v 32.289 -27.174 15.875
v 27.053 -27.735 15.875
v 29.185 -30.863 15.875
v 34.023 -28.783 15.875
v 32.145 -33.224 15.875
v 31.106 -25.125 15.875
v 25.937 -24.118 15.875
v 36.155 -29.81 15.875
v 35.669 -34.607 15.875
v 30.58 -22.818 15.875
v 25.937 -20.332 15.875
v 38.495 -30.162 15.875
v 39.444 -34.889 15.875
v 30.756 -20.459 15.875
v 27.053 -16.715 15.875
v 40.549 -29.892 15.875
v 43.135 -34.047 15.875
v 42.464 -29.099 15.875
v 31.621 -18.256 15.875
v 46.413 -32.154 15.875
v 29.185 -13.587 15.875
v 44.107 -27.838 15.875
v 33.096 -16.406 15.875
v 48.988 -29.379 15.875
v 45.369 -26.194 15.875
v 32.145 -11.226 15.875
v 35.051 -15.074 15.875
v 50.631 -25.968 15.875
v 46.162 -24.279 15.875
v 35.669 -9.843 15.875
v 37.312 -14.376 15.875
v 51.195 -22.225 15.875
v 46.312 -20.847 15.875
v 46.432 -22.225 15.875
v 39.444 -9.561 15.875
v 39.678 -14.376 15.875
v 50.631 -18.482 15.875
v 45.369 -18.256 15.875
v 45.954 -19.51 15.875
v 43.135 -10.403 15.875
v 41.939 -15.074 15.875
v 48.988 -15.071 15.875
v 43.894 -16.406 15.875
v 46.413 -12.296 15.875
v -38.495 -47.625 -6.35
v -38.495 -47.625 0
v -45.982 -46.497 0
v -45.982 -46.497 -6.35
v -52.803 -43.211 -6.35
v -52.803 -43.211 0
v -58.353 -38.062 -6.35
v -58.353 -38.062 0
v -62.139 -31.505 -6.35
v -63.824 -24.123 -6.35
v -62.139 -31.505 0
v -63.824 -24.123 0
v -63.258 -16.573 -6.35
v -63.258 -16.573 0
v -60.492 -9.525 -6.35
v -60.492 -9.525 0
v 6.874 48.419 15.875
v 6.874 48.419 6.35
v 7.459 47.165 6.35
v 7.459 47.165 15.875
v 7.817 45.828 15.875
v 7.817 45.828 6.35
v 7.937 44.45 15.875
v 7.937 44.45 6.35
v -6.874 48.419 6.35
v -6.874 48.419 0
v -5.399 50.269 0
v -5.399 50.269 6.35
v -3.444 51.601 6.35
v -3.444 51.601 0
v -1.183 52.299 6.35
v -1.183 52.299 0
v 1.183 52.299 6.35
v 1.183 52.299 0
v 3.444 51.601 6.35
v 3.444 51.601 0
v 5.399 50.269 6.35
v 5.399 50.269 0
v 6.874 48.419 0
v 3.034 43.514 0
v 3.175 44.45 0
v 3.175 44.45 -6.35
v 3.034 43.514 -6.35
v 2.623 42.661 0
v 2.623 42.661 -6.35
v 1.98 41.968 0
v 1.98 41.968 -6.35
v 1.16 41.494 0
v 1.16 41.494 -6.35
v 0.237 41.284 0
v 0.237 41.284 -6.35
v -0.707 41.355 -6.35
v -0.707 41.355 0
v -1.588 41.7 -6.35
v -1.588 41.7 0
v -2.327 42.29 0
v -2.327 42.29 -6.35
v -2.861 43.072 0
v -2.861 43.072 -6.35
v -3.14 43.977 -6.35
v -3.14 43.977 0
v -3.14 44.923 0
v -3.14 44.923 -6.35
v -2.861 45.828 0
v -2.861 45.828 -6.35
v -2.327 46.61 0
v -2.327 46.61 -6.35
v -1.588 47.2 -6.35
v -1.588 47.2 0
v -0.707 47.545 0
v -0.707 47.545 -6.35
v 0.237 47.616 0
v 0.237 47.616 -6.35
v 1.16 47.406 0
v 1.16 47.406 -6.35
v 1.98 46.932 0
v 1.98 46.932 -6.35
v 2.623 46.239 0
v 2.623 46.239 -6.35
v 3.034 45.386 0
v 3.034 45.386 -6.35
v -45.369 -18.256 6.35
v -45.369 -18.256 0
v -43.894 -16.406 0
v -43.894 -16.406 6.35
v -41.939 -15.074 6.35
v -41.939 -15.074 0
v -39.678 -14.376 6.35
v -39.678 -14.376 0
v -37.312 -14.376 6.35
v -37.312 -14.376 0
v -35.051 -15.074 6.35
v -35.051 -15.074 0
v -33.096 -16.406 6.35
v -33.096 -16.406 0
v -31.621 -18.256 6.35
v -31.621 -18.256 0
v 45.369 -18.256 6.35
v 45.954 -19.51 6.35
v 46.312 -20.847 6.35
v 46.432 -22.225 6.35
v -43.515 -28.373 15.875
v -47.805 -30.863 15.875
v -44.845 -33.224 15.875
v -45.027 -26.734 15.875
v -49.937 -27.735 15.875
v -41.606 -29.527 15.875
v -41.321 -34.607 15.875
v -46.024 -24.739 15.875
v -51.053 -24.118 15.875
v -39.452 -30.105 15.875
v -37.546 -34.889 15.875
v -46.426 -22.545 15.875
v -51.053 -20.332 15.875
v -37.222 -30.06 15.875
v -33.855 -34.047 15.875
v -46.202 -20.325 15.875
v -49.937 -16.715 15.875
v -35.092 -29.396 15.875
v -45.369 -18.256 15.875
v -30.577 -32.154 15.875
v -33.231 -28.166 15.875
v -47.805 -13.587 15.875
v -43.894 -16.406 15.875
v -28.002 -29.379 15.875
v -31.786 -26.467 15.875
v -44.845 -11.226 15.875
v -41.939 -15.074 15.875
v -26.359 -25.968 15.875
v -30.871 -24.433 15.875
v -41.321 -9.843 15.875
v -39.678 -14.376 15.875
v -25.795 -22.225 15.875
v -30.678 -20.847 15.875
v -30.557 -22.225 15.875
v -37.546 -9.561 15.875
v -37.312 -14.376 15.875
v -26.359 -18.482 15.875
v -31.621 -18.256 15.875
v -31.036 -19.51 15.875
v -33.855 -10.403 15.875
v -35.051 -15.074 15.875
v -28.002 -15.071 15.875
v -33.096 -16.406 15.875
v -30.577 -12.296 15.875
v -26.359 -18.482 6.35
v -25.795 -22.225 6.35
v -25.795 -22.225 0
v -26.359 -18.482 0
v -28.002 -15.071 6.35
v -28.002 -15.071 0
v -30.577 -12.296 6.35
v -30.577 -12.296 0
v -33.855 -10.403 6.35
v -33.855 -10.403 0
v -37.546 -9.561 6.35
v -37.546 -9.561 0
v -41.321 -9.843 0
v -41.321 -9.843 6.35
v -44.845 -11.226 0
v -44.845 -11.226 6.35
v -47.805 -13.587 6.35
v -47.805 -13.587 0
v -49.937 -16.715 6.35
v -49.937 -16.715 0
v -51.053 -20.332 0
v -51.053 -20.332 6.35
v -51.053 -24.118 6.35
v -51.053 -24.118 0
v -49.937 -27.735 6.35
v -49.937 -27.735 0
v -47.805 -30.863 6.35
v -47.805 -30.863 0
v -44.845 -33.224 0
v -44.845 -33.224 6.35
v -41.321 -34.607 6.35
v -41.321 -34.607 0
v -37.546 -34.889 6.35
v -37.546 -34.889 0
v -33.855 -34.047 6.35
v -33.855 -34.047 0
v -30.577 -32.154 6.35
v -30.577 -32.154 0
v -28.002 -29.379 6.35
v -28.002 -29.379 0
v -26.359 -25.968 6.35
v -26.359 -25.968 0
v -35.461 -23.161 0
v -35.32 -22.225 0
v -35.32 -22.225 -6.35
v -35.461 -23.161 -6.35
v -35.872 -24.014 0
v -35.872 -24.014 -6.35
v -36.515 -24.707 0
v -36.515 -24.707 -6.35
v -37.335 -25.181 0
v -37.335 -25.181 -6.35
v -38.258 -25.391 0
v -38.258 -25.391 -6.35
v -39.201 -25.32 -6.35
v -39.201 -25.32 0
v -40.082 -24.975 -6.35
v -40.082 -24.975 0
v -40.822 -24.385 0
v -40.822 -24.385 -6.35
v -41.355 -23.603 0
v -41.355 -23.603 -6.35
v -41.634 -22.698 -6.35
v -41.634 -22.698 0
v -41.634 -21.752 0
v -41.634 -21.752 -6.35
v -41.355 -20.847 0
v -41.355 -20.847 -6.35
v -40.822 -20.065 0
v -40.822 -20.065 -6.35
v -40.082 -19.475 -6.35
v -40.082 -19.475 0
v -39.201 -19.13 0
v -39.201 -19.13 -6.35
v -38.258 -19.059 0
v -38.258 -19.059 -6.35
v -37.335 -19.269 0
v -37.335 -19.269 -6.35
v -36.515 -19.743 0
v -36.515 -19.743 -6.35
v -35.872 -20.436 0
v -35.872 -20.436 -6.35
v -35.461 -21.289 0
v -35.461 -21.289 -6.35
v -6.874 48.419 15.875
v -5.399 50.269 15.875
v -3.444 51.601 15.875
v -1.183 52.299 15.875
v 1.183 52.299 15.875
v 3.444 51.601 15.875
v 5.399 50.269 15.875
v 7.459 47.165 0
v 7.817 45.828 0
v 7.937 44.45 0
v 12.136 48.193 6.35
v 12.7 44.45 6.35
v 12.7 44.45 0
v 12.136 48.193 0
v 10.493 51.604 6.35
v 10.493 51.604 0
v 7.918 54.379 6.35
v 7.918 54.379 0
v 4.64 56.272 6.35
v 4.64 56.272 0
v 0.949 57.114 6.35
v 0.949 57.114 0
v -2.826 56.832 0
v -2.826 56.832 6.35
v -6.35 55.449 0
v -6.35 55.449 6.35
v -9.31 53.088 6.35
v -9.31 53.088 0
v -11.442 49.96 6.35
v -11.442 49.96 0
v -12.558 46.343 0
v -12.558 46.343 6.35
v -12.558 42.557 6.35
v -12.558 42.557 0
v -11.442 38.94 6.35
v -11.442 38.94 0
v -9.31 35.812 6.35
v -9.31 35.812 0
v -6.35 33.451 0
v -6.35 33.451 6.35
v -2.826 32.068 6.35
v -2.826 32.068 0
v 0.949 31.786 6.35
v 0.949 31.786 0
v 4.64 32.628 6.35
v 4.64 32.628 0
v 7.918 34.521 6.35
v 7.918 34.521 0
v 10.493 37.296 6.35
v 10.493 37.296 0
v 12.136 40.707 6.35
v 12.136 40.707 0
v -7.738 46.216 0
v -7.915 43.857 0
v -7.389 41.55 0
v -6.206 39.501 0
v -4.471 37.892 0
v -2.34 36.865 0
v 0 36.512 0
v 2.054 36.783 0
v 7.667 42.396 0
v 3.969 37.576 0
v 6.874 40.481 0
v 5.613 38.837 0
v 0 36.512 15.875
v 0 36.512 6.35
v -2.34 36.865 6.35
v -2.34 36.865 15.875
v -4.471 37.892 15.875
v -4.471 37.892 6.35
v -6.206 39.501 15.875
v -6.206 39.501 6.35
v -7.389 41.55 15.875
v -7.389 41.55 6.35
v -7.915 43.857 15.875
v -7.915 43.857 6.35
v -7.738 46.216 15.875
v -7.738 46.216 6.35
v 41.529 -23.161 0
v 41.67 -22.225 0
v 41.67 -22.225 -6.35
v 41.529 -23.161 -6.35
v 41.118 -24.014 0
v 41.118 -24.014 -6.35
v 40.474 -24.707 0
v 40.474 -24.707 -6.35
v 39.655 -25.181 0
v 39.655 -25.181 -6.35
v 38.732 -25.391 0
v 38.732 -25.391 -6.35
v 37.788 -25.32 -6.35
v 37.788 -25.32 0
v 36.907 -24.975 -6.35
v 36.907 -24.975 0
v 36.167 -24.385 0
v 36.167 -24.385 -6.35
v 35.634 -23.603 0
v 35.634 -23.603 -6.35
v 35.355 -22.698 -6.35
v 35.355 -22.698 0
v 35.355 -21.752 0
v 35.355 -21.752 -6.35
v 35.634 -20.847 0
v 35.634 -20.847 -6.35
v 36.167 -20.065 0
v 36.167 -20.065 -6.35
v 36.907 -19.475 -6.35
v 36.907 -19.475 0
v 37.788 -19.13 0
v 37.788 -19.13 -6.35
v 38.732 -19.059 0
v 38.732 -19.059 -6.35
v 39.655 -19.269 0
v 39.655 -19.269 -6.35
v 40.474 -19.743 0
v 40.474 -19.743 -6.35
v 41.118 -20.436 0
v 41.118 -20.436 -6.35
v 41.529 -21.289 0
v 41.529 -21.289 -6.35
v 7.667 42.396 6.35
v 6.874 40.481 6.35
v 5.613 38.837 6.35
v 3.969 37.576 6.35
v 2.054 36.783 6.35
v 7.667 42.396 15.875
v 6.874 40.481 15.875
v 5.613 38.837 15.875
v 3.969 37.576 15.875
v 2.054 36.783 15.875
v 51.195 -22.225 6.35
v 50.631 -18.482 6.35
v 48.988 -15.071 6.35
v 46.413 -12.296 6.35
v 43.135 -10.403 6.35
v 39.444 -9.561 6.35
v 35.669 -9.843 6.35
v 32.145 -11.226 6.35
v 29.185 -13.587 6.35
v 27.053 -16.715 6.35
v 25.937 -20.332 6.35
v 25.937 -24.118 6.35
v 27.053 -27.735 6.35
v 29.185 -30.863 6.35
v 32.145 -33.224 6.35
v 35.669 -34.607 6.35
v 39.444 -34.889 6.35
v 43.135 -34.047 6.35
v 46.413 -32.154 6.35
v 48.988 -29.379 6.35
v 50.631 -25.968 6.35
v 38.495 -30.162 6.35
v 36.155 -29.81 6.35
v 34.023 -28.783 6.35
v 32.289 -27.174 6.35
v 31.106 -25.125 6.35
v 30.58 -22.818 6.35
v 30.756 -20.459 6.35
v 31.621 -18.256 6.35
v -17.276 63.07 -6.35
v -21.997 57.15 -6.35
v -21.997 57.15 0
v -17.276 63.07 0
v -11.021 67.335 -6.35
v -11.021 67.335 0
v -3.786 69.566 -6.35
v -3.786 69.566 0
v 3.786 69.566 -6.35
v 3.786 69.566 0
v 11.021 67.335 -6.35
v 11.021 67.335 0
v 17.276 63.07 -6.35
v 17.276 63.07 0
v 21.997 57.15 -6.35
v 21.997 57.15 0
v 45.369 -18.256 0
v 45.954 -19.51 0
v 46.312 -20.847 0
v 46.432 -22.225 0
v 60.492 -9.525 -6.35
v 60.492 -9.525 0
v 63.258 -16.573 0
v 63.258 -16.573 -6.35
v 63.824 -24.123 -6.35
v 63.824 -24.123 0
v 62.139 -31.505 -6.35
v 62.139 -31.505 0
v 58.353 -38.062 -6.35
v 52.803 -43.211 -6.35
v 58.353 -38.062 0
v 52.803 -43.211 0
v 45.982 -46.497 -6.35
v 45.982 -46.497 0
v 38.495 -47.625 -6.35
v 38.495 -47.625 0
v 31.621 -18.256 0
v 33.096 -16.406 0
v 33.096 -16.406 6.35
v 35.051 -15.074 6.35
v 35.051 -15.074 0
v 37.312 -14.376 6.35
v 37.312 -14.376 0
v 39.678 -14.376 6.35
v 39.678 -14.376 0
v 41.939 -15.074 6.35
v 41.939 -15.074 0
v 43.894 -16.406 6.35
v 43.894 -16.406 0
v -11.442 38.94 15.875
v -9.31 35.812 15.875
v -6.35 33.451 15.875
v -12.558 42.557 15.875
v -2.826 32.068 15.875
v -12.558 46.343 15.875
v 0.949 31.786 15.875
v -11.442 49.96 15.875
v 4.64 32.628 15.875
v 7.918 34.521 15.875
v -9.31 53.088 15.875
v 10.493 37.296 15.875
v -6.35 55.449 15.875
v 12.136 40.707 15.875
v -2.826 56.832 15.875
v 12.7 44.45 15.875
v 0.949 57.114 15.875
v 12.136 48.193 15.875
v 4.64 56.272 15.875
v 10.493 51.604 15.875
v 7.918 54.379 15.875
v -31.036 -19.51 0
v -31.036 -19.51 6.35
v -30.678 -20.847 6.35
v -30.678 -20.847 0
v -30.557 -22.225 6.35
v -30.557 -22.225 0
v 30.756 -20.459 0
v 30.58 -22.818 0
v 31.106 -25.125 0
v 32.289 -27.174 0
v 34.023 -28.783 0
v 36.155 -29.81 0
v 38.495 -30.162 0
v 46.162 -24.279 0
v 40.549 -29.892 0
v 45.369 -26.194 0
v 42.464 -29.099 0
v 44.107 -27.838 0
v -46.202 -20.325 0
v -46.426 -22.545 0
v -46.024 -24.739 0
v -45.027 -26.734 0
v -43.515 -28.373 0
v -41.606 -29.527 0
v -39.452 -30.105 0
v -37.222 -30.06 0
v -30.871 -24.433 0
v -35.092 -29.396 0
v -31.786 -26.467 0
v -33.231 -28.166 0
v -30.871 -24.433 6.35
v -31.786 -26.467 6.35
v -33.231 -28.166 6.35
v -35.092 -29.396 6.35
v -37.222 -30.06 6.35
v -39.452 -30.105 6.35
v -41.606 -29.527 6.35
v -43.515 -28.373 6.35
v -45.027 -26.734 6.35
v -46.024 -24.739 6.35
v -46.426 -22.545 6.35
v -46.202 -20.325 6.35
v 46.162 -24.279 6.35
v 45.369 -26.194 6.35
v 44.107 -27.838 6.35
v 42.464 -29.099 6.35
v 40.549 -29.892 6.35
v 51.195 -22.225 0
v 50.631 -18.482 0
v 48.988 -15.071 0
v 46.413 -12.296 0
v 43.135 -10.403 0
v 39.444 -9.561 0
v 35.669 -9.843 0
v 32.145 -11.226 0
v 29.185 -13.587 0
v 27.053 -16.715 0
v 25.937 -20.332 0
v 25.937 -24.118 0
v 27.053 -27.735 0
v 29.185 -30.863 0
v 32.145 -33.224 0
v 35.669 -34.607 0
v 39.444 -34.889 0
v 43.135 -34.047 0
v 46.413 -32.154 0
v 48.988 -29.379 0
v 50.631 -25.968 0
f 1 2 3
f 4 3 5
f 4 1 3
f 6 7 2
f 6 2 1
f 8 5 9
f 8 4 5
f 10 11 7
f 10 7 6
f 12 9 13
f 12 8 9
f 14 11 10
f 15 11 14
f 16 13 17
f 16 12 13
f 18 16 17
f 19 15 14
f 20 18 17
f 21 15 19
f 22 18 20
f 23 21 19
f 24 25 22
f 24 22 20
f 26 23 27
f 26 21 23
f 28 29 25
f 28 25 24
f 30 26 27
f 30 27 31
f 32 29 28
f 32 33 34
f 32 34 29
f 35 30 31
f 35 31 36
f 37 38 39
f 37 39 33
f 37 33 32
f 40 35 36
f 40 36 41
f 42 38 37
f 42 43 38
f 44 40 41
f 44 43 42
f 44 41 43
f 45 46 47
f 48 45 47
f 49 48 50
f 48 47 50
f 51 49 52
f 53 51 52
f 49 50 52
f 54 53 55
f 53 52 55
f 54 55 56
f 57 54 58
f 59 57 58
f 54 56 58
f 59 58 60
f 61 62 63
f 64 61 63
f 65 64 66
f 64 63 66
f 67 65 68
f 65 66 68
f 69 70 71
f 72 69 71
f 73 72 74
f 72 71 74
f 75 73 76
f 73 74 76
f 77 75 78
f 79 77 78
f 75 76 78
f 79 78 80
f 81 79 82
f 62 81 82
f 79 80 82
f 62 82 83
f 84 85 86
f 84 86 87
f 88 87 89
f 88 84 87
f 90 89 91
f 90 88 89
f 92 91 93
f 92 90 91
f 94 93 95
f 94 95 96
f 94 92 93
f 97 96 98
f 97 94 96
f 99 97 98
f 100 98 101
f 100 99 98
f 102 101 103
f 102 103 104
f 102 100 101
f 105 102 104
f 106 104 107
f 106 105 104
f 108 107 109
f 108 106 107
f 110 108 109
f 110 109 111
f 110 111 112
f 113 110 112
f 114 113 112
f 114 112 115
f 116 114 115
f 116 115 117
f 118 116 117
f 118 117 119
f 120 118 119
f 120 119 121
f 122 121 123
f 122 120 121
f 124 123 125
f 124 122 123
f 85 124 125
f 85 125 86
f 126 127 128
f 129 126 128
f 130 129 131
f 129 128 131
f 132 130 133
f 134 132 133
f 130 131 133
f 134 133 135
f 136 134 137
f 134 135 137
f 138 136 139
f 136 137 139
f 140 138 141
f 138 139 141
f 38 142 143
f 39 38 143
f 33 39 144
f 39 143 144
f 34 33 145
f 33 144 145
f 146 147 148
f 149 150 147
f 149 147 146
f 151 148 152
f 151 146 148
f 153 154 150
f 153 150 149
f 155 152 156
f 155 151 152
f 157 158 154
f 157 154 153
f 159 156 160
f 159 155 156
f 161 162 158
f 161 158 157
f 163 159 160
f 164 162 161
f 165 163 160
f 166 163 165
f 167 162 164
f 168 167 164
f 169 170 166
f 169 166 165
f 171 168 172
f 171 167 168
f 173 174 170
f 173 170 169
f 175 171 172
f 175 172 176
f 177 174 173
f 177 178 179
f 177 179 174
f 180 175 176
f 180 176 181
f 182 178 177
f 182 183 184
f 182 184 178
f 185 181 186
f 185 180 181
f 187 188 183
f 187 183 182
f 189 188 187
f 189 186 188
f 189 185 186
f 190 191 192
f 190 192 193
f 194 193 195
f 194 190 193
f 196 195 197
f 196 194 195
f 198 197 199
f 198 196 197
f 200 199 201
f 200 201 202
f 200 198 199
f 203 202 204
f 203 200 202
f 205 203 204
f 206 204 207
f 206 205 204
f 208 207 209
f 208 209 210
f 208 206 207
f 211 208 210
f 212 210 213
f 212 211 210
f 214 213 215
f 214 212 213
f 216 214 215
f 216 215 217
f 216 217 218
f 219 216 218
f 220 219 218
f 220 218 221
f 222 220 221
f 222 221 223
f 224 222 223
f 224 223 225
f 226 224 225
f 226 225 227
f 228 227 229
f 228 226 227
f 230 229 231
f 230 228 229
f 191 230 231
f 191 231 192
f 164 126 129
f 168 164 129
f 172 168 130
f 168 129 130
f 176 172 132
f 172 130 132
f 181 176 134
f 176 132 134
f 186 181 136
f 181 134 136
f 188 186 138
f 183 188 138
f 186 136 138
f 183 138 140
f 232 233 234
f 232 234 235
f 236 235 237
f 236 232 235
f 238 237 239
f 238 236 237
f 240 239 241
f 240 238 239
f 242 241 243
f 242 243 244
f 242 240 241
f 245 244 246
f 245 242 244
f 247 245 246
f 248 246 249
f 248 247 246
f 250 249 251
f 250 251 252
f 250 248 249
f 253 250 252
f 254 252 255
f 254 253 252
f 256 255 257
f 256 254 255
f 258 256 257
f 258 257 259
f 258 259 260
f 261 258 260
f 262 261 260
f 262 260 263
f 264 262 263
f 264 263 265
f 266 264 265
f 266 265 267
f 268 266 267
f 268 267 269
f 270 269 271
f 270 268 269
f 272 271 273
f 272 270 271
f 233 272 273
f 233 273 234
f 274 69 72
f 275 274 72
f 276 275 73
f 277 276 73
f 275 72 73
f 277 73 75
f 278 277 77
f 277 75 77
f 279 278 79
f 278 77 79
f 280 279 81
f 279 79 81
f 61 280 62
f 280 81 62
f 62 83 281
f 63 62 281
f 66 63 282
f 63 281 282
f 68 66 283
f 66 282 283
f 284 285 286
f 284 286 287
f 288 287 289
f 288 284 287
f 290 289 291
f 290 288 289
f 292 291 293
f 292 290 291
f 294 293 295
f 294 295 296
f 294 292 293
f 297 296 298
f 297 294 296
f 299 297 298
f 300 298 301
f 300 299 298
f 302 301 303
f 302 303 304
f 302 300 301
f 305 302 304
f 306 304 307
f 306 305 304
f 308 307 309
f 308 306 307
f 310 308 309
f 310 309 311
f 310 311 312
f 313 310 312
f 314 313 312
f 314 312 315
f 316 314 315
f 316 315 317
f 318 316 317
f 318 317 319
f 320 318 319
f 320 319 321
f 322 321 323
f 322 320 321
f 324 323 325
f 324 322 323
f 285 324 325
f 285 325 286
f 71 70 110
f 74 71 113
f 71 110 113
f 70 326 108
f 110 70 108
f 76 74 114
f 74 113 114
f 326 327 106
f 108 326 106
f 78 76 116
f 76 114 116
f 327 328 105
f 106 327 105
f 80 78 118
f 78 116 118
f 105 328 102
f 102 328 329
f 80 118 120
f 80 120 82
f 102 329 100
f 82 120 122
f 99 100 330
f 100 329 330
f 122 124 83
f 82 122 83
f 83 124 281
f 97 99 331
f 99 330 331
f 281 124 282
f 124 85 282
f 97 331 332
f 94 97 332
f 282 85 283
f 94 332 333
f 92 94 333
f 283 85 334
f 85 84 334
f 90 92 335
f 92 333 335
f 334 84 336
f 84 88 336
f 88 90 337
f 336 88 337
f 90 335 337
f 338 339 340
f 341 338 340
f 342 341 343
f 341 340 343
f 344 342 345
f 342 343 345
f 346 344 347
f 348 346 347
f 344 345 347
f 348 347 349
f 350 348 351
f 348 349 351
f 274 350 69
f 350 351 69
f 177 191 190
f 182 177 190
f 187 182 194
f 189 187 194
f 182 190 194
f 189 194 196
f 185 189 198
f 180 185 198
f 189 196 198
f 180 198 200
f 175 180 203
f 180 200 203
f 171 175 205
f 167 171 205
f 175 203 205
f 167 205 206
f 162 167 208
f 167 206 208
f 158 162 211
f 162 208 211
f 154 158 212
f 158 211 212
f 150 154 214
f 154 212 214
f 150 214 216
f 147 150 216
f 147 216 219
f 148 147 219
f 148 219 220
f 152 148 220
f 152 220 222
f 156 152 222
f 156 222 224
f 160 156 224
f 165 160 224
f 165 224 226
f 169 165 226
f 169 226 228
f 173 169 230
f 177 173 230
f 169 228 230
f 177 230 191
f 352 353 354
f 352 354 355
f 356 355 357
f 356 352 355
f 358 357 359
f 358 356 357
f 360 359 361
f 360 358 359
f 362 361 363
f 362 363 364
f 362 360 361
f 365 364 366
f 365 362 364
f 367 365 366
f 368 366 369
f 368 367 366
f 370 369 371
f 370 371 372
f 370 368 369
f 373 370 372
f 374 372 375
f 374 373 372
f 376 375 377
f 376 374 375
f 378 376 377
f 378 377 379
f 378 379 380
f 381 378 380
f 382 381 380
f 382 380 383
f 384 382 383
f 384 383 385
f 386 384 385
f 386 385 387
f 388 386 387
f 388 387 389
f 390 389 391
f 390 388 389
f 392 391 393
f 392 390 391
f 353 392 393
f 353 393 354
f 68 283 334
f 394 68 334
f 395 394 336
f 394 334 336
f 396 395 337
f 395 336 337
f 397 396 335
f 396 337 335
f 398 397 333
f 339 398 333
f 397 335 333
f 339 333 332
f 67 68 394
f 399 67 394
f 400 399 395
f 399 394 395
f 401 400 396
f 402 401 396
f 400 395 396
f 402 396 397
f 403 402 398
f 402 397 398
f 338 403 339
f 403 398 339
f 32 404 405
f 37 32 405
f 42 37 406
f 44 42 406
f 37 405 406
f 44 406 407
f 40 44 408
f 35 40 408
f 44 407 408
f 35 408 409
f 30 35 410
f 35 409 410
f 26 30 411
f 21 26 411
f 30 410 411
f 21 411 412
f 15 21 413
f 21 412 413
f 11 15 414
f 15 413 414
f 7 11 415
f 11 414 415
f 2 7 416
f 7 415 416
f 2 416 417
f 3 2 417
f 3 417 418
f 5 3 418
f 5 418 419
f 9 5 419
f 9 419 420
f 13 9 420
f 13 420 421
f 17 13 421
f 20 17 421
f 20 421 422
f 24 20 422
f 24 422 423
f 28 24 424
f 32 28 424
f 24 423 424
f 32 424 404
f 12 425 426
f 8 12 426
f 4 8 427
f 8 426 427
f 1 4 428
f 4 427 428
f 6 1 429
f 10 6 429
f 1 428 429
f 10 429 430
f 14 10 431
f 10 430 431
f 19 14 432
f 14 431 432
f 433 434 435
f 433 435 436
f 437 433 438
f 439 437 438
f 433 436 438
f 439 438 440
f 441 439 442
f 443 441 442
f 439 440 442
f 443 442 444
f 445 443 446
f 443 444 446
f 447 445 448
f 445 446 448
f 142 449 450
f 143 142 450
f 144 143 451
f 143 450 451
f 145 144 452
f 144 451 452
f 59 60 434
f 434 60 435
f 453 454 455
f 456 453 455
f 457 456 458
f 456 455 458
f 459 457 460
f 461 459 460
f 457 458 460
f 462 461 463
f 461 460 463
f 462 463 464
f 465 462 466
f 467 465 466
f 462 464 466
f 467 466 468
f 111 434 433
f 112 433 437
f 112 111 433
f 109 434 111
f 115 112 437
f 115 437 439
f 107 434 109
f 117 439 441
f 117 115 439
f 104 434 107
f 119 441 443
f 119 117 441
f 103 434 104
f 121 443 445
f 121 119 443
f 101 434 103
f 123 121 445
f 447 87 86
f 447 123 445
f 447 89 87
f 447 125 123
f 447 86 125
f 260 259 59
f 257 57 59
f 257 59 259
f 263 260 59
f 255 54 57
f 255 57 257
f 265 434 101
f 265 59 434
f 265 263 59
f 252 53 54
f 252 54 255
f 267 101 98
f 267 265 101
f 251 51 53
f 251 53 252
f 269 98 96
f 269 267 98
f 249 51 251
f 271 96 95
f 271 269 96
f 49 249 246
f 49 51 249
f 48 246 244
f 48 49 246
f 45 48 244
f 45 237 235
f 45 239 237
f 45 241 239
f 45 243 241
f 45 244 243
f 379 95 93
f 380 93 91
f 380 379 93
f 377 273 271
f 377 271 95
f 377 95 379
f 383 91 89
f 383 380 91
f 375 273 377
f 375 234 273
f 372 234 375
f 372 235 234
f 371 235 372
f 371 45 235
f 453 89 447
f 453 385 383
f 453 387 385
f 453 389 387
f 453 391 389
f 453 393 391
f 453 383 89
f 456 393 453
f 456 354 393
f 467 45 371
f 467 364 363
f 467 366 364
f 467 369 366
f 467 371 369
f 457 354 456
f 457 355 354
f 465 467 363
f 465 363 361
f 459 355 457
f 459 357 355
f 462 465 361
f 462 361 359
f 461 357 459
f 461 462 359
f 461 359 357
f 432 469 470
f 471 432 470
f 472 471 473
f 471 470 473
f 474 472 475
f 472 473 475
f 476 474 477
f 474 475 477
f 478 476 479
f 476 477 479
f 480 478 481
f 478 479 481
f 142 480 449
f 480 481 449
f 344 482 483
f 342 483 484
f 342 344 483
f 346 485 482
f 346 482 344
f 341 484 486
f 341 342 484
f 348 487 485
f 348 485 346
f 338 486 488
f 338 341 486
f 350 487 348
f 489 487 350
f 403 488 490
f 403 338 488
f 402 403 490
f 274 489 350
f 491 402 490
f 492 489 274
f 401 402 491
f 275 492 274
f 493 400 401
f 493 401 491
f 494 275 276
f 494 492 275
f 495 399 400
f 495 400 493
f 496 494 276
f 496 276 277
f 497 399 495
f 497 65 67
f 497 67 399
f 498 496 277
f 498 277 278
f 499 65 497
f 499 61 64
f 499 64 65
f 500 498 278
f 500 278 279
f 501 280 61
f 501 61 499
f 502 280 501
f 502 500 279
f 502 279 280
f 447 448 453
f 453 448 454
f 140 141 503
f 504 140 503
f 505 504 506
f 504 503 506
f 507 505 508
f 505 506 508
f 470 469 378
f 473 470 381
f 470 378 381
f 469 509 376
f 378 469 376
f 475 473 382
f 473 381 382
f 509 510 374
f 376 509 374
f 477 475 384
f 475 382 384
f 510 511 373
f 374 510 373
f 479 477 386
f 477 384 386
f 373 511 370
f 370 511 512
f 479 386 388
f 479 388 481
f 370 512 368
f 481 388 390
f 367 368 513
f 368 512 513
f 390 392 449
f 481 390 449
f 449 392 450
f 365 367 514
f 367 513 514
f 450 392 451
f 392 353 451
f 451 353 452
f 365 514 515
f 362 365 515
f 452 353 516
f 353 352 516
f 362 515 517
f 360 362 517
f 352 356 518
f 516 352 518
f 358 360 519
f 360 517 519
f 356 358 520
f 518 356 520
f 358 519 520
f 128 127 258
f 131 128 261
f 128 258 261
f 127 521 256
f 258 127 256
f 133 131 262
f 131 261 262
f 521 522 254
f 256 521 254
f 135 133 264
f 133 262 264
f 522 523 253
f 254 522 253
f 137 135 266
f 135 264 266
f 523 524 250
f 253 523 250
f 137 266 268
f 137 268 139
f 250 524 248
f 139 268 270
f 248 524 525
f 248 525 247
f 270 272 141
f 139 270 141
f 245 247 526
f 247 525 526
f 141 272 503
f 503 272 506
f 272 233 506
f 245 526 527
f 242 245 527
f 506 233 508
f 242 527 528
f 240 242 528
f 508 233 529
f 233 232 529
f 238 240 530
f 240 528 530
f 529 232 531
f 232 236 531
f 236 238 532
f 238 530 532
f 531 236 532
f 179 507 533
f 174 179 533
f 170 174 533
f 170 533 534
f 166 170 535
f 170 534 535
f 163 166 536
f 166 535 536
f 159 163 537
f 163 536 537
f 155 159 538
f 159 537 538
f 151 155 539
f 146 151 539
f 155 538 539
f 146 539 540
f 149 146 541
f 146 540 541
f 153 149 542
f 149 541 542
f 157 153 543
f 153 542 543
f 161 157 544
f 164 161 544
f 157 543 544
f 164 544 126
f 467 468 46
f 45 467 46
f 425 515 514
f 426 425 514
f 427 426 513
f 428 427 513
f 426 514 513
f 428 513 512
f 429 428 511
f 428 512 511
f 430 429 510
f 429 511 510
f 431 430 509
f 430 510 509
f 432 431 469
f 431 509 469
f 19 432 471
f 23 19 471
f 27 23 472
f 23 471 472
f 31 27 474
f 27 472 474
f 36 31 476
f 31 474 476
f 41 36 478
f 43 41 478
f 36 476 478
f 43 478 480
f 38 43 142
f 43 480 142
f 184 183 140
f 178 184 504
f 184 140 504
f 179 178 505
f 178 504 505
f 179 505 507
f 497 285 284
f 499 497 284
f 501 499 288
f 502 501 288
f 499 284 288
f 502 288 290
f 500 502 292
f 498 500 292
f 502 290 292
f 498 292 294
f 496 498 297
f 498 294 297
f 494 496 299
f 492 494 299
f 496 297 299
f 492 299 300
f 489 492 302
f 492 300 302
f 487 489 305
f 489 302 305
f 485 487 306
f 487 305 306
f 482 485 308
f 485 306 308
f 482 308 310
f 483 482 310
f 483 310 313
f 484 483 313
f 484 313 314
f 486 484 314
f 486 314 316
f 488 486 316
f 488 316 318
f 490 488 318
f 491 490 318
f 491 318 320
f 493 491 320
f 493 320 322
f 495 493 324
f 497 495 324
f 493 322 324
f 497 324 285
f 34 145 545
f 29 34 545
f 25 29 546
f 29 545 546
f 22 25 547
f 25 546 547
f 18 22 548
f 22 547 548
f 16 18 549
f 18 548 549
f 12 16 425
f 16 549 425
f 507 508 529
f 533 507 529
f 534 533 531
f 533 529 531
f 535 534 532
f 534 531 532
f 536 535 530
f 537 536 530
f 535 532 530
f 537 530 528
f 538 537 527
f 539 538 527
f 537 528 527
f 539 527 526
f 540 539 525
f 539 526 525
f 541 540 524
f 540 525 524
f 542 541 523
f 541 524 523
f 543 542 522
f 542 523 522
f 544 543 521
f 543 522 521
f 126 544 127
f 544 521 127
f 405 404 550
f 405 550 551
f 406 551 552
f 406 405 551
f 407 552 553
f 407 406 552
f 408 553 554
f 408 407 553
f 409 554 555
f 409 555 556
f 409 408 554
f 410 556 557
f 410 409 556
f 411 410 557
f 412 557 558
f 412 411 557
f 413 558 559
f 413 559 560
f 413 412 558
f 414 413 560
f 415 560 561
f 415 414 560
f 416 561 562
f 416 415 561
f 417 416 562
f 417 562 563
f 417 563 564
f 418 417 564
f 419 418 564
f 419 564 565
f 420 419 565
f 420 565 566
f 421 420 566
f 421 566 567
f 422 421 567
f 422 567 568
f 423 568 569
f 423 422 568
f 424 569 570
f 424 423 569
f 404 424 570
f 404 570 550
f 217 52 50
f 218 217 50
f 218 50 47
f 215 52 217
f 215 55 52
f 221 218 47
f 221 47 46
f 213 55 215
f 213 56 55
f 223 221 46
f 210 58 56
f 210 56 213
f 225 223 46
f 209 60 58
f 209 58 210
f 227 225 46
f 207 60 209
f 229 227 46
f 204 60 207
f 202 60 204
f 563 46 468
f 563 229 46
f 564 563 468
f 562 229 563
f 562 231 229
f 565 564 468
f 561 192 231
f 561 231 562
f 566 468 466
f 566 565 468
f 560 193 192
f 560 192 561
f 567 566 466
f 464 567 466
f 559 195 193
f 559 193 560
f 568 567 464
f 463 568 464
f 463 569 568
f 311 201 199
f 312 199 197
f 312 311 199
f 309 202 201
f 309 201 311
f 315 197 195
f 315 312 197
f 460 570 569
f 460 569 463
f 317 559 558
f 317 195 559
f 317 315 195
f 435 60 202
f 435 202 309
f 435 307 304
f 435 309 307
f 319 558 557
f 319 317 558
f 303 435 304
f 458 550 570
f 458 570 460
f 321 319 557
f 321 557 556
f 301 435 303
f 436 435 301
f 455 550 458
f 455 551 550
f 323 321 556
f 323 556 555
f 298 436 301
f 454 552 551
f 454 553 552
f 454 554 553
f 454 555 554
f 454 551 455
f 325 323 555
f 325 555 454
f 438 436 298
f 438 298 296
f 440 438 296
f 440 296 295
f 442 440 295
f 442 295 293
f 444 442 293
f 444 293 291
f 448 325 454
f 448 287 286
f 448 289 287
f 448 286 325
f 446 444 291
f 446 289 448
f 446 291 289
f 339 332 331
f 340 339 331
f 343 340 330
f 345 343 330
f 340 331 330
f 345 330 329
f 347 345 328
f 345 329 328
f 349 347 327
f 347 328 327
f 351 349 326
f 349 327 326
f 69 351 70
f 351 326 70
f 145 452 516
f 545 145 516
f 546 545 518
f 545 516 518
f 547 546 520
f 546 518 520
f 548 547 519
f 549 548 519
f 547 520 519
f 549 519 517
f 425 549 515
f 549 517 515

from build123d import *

# Parameters (mm, degrees)
F1_DEPTH = 6.35
F2_R     = 7.9375
F2_R_2   = 3.175
F3_DEPTH = 6.35
F4_R     = 12.7
F5_DEPTH = 6.35
F6_DEPTH = 9.525


with BuildPart() as f1:
    # F0 (on Top) → F1 (new body)
    with BuildSketch(Plane.XY):
        with BuildLine():
            Line((-31.6207525557, -18.25625), (0, 0))
            Line((0, 0), (0, 36.5125))
            ThreePointArc((0, 36.5125), (-6.8740766425, 40.48125), (-6.8740766425, 48.41875))
            Line((-6.8740766425, 48.41875), (-21.9970452561, 57.15))
            Line((-21.9970452561, 57.15), (-60.4918744543, -9.525))
            Line((-60.4918744543, -9.525), (-45.3689058408, -18.25625))
            ThreePointArc((-45.3689058408, -18.25625), (-38.4948291982, -14.2875), (-31.6207525557, -18.25625))
        make_face()
        with BuildLine():
            ThreePointArc((-38.4948291982, -30.1625), (-45.3689058408, -26.19375), (-45.3689058408, -18.25625))
            Line((-45.3689058408, -18.25625), (-60.4918744543, -9.525))
            ThreePointArc((-60.4918744543, -9.525), (-60.4918744543, -34.925), (-38.4948291982, -47.625))
            Line((-38.4948291982, -47.625), (-38.4948291982, -30.1625))
        make_face()
        with BuildLine():
            Line((31.6207525557, -18.25625), (0, 0))
            Line((0, 0), (-31.6207525557, -18.25625))
            ThreePointArc((-31.6207525557, -18.25625), (-30.827792952, -20.1706238295), (-30.5573291982, -22.225))
            ThreePointArc((-30.5573291982, -22.225), (-32.8821691226, -27.8376600757), (-38.4948291982, -30.1625))
            Line((-38.4948291982, -30.1625), (-38.4948291982, -47.625))
            Line((-38.4948291982, -47.625), (38.4948291982, -47.625))
            Line((38.4948291982, -47.625), (38.4948291982, -30.1625))
            ThreePointArc((38.4948291982, -30.1625), (31.6207525557, -26.19375), (31.6207525557, -18.25625))
        make_face()
        with BuildLine():
            Line((60.4918744543, -9.525), (45.3689058408, -18.25625))
            ThreePointArc((45.3689058408, -18.25625), (46.1618654444, -20.1706238295), (46.4323291982, -22.225))
            ThreePointArc((46.4323291982, -22.225), (44.1074892739, -27.8376600757), (38.4948291982, -30.1625))
            Line((38.4948291982, -30.1625), (38.4948291982, -47.625))
            ThreePointArc((38.4948291982, -47.625), (60.4918744543, -34.925), (60.4918744543, -9.525))
        make_face()
        with BuildLine():
            Line((0, 36.5125), (0, 0))
            Line((0, 0), (31.6207525557, -18.25625))
            ThreePointArc((31.6207525557, -18.25625), (38.4948291982, -14.2875), (45.3689058408, -18.25625))
            Line((45.3689058408, -18.25625), (60.4918744543, -9.525))
            Line((60.4918744543, -9.525), (21.9970452561, 57.15))
            Line((21.9970452561, 57.15), (6.8740766425, 48.41875))
            ThreePointArc((6.8740766425, 48.41875), (7.6670362462, 46.5043761705), (7.9375, 44.45))
            ThreePointArc((7.9375, 44.45), (5.6126600757, 38.8373399243), (0, 36.5125))
        make_face()
        with BuildLine():
            Line((-21.9970452561, 57.15), (-6.8740766425, 48.41875))
            ThreePointArc((-6.8740766425, 48.41875), (0, 52.3875), (6.8740766425, 48.41875))
            Line((6.8740766425, 48.41875), (21.9970452561, 57.15))
            ThreePointArc((21.9970452561, 57.15), (0, 69.85), (-21.9970452561, 57.15))
        make_face()
    extrude(amount=F1_DEPTH)

    # F2 (on face) → F3 (join)
    with BuildSketch(Plane(origin=(0, 0, 0), x_dir=(1, 0, 0), z_dir=(0, 0, -1))):
        with BuildLine():
            ThreePointArc((-38.4948291982, 47.625), (-60.4918744543, 34.925), (-60.4918744543, 9.525))
            Line((-60.4918744543, 9.525), (-21.9970452561, -57.15))
            ThreePointArc((-21.9970452561, -57.15), (0, -69.85), (21.9970452561, -57.15))
            Line((21.9970452561, -57.15), (60.4918744543, 9.525))
            ThreePointArc((60.4918744543, 9.525), (60.4918744543, 34.925), (38.4948291982, 47.625))
            Line((38.4948291982, 47.625), (-38.4948291982, 47.625))
        make_face()
        with Locations((0, -44.45)):
            Circle(F2_R, mode=Mode.SUBTRACT)
        with Locations((-38.4948291982, 22.225)):
            Circle(F2_R, mode=Mode.SUBTRACT)
        with Locations((38.4948291982, 22.225)):
            Circle(F2_R, mode=Mode.SUBTRACT)
        with Locations((0, -44.45)):
            Circle(F2_R)
        with Locations((0, -44.45)):
            Circle(F2_R_2, mode=Mode.SUBTRACT)
        with Locations((38.4948291982, 22.225)):
            Circle(F2_R)
        with Locations((38.4948291982, 22.225)):
            Circle(F2_R_2, mode=Mode.SUBTRACT)
        with Locations((-38.4948291982, 22.225)):
            Circle(F2_R)
        with Locations((-38.4948291982, 22.225)):
            Circle(F2_R_2, mode=Mode.SUBTRACT)
    extrude(amount=F3_DEPTH)

    # F4 (on face) → F5 (cut)
    with BuildSketch(Plane.XY.offset(6.35)):
        with BuildLine():
            ThreePointArc((21.9970452561, 57.15), (0, 69.85), (-21.9970452561, 57.15))
            Line((-21.9970452561, 57.15), (-60.4918744543, -9.525))
            ThreePointArc((-60.4918744543, -9.525), (-60.4918744543, -34.925), (-38.4948291982, -47.625))
            Line((-38.4948291982, -47.625), (38.4948291982, -47.625))
            ThreePointArc((38.4948291982, -47.625), (60.4918744543, -34.925), (60.4918744543, -9.525))
            Line((60.4918744543, -9.525), (21.9970452561, 57.15))
        make_face()
        with Locations((-38.4948291982, -22.225)):
            Circle(F4_R, mode=Mode.SUBTRACT)
        with Locations((38.4948291982, -22.225)):
            Circle(F4_R, mode=Mode.SUBTRACT)
        with Locations((0, 44.45)):
            Circle(F4_R, mode=Mode.SUBTRACT)
    extrude(amount=-F5_DEPTH, mode=Mode.SUBTRACT)

    # F6 (add): faces of the model
    f6_faces = [f1.faces().sort_by_distance(p)[0] for p in [
        (-50.8356189534, -22.225, 6.35),
        (-12.3407897552, 44.45, 6.35),
        (26.1540394431, -22.225, 6.35),
    ]]
    extrude(f6_faces, amount=F6_DEPTH)


solid = f1.part
